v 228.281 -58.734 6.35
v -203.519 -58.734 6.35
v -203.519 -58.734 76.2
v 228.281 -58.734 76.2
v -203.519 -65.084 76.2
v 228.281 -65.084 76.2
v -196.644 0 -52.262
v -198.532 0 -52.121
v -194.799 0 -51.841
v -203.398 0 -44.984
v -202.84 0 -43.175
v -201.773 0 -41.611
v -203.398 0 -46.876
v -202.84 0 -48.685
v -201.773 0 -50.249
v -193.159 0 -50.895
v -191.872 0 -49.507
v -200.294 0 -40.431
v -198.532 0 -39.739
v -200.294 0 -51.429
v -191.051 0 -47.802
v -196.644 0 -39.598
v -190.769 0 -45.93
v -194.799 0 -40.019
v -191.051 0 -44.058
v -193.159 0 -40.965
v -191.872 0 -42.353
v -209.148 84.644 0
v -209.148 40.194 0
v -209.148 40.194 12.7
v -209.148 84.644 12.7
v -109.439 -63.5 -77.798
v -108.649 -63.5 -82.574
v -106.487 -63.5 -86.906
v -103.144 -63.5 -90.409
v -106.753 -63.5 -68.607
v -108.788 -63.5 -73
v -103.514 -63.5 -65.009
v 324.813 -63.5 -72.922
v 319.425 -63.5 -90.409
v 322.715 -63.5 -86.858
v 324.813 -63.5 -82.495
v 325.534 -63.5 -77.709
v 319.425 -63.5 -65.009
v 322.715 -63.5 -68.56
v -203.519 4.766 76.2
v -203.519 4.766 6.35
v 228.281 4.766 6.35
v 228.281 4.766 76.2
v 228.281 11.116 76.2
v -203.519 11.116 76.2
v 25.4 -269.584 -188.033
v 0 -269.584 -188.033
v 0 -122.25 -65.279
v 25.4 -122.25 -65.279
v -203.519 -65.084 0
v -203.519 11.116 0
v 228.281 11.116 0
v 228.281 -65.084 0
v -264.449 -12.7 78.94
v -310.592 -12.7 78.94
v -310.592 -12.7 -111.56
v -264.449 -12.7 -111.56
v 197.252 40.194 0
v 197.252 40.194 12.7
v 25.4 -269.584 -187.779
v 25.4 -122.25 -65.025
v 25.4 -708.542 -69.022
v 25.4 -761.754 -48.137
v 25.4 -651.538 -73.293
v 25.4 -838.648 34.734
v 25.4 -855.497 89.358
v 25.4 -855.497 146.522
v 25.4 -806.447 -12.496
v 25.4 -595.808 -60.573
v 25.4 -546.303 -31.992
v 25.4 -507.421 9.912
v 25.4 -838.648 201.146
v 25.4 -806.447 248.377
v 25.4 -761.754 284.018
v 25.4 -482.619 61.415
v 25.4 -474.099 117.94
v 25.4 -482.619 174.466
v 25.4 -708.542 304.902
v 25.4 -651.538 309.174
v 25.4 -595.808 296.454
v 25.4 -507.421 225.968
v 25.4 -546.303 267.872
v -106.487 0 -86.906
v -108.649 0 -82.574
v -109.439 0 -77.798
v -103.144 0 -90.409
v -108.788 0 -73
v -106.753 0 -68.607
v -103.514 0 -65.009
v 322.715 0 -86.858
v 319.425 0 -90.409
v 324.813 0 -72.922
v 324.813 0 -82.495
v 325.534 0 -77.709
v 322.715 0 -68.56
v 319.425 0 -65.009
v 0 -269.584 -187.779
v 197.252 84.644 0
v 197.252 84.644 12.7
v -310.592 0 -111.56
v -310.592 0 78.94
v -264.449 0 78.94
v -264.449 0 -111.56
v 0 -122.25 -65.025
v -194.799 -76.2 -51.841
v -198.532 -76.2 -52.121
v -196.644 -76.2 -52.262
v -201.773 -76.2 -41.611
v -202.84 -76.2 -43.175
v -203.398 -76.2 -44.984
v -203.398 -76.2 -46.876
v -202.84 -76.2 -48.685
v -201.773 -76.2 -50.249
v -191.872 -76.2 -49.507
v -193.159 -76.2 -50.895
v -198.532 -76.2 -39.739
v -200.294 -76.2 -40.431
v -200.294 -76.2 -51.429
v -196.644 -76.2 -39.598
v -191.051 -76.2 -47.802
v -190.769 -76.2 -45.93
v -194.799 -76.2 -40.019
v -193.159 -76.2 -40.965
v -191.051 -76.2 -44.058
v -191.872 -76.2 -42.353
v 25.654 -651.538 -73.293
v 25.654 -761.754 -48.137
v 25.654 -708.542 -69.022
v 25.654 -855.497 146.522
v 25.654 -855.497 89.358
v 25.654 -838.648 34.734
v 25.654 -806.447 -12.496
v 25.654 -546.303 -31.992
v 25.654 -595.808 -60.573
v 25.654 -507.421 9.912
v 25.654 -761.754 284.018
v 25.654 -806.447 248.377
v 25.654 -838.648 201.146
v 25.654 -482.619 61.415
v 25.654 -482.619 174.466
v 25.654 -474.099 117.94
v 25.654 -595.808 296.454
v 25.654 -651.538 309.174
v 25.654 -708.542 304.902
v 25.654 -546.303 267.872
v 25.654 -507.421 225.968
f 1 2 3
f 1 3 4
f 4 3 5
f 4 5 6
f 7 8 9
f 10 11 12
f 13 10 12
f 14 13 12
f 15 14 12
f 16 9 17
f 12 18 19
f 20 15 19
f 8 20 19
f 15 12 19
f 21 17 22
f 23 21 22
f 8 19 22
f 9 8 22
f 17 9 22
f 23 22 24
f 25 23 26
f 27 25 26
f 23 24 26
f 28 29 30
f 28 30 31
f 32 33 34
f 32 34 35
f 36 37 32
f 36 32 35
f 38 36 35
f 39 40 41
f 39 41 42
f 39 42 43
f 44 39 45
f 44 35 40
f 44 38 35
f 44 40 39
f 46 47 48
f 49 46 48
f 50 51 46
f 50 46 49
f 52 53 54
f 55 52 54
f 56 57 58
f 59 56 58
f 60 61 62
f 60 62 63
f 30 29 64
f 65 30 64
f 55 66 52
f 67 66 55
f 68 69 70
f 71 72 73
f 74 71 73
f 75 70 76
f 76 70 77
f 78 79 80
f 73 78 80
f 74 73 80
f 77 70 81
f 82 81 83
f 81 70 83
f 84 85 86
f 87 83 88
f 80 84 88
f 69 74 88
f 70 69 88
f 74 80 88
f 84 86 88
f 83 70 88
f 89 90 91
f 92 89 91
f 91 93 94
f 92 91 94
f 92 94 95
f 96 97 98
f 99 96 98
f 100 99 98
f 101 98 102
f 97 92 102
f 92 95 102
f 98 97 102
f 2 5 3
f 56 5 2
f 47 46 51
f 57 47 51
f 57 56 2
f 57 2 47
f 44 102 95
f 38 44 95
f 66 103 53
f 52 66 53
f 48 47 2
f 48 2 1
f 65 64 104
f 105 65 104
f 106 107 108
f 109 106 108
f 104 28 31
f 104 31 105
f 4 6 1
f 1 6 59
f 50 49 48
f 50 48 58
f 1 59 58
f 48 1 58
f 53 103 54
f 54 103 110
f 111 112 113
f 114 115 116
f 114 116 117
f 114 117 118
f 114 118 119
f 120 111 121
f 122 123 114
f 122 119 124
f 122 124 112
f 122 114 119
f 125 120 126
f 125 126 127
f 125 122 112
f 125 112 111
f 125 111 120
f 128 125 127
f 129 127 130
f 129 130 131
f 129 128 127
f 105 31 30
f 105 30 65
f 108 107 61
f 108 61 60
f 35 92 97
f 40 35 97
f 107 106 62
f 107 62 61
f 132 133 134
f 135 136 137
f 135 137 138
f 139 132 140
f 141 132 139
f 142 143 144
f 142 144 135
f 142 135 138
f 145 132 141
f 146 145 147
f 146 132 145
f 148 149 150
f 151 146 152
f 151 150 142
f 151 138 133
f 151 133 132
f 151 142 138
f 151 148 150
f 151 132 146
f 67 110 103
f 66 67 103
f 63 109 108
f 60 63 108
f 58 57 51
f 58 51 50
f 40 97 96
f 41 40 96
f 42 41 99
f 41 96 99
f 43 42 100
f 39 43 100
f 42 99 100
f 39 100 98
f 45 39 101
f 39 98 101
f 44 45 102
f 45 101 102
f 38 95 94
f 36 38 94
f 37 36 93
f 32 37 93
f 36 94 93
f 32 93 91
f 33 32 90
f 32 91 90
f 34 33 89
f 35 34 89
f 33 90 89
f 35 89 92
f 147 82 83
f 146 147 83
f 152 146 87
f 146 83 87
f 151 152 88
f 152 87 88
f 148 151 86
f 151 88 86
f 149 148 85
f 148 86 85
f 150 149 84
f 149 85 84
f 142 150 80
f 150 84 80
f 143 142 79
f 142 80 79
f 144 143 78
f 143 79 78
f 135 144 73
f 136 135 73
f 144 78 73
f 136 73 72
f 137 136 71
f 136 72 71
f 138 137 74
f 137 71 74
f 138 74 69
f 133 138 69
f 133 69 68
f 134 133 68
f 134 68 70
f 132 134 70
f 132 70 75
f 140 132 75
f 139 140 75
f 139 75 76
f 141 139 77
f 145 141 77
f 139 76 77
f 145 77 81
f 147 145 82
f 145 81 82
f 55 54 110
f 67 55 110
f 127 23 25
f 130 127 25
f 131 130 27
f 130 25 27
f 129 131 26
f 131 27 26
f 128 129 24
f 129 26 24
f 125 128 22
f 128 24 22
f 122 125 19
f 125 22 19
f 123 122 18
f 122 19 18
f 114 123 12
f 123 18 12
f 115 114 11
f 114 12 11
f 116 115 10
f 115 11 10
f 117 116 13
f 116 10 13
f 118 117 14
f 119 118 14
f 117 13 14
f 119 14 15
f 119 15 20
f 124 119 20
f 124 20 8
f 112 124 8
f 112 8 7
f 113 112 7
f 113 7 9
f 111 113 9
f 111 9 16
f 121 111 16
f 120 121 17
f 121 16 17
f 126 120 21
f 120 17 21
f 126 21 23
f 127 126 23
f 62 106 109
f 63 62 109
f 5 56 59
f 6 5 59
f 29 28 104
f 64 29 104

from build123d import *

# Parameters (mm, degrees)
F0_W      = 431.8
F0_H      = 76.2
F1_DEPTH  = 6.35
F2_W      = 431.8
F2_H      = 6.35
F3_DEPTH  = 69.85
F4_W      = 406.4
F4_H      = 44.45
F5_DEPTH  = 12.7
F6_R      = 6.35
F7_DEPTH  = 76.2
F9_DEPTH  = 63.5
F10_W     = 46.143317
F10_H     = 190.5
F11_DEPTH = 12.7
F13_DEPTH = 25.4
F14_R     = 191.77
F15_DEPTH = 0.254


with BuildPart() as f1:
    # F0 (on Top) → F1 (new body)
    with BuildSketch(Plane.XY):
        with Locations((12.38066, -26.983879)):
            Rectangle(F0_W, F0_H)
    extrude(amount=F1_DEPTH)

    # F2 (on face) → F3 (join)
    with BuildSketch(Plane.XY.offset(6.35)):
        with Locations((12.38066, 7.941121)):
            Rectangle(F2_W, F2_H)
        with Locations((12.38066, -61.908879)):
            Rectangle(F2_W, F2_H)
    extrude(amount=F3_DEPTH)


with BuildPart() as f5:
    # F4 (on Top) → F5 (new body)
    with BuildSketch(Plane.XY):
        with Locations((-5.947866, 62.418744)):
            Rectangle(F4_W, F4_H)
    extrude(amount=F5_DEPTH)


with BuildPart() as f7:
    # F6 (on Front) → F7 (new body)
    with BuildSketch(Plane.XZ):
        with Locations((-197.11858, -45.929994)):
            Circle(F6_R)
    extrude(amount=F7_DEPTH)


with BuildPart() as f9:
    # F8 (on Front) → F9 (new body)
    with BuildSketch(Plane.XZ):
        with BuildLine():
            ThreePointArc((319.424903, -90.408714), (325.53391, -77.708714), (319.424903, -65.008714))
            Line((319.424903, -65.008714), (-103.514101, -65.008714))
            ThreePointArc((-103.514101, -65.008714), (-109.439342, -77.797623), (-103.144498, -90.408714))
            Line((-103.144498, -90.408714), (319.424903, -90.408714))
        make_face()
    extrude(amount=F9_DEPTH)


with BuildPart() as f11:
    # F10 (on Front) → F11 (new body)
    with BuildSketch(Plane.XZ):
        with Locations((-287.52032, -16.310006)):
            Rectangle(F10_W, F10_H)
    extrude(amount=F11_DEPTH)


with BuildPart() as f13:
    # F12 (on Right) → F13 (new body)
    with BuildSketch(Plane.YZ):
        Polygon((-122.250272, -65.024962), (-269.584003, -187.778799), (-269.584003, -188.032799), (-122.250272, -65.278962), align=None)
    extrude(amount=F13_DEPTH)


with BuildPart() as f15:
    # F14 (on face) → F15 (new body)
    with BuildSketch(Plane.YZ.offset(25.4)):
        with Locations((-665.869236, 117.940322)):
            Circle(F14_R)
    extrude(amount=F15_DEPTH)


solid = Compound([f1.part, f5.part, f7.part, f9.part, f11.part, f13.part, f15.part])
